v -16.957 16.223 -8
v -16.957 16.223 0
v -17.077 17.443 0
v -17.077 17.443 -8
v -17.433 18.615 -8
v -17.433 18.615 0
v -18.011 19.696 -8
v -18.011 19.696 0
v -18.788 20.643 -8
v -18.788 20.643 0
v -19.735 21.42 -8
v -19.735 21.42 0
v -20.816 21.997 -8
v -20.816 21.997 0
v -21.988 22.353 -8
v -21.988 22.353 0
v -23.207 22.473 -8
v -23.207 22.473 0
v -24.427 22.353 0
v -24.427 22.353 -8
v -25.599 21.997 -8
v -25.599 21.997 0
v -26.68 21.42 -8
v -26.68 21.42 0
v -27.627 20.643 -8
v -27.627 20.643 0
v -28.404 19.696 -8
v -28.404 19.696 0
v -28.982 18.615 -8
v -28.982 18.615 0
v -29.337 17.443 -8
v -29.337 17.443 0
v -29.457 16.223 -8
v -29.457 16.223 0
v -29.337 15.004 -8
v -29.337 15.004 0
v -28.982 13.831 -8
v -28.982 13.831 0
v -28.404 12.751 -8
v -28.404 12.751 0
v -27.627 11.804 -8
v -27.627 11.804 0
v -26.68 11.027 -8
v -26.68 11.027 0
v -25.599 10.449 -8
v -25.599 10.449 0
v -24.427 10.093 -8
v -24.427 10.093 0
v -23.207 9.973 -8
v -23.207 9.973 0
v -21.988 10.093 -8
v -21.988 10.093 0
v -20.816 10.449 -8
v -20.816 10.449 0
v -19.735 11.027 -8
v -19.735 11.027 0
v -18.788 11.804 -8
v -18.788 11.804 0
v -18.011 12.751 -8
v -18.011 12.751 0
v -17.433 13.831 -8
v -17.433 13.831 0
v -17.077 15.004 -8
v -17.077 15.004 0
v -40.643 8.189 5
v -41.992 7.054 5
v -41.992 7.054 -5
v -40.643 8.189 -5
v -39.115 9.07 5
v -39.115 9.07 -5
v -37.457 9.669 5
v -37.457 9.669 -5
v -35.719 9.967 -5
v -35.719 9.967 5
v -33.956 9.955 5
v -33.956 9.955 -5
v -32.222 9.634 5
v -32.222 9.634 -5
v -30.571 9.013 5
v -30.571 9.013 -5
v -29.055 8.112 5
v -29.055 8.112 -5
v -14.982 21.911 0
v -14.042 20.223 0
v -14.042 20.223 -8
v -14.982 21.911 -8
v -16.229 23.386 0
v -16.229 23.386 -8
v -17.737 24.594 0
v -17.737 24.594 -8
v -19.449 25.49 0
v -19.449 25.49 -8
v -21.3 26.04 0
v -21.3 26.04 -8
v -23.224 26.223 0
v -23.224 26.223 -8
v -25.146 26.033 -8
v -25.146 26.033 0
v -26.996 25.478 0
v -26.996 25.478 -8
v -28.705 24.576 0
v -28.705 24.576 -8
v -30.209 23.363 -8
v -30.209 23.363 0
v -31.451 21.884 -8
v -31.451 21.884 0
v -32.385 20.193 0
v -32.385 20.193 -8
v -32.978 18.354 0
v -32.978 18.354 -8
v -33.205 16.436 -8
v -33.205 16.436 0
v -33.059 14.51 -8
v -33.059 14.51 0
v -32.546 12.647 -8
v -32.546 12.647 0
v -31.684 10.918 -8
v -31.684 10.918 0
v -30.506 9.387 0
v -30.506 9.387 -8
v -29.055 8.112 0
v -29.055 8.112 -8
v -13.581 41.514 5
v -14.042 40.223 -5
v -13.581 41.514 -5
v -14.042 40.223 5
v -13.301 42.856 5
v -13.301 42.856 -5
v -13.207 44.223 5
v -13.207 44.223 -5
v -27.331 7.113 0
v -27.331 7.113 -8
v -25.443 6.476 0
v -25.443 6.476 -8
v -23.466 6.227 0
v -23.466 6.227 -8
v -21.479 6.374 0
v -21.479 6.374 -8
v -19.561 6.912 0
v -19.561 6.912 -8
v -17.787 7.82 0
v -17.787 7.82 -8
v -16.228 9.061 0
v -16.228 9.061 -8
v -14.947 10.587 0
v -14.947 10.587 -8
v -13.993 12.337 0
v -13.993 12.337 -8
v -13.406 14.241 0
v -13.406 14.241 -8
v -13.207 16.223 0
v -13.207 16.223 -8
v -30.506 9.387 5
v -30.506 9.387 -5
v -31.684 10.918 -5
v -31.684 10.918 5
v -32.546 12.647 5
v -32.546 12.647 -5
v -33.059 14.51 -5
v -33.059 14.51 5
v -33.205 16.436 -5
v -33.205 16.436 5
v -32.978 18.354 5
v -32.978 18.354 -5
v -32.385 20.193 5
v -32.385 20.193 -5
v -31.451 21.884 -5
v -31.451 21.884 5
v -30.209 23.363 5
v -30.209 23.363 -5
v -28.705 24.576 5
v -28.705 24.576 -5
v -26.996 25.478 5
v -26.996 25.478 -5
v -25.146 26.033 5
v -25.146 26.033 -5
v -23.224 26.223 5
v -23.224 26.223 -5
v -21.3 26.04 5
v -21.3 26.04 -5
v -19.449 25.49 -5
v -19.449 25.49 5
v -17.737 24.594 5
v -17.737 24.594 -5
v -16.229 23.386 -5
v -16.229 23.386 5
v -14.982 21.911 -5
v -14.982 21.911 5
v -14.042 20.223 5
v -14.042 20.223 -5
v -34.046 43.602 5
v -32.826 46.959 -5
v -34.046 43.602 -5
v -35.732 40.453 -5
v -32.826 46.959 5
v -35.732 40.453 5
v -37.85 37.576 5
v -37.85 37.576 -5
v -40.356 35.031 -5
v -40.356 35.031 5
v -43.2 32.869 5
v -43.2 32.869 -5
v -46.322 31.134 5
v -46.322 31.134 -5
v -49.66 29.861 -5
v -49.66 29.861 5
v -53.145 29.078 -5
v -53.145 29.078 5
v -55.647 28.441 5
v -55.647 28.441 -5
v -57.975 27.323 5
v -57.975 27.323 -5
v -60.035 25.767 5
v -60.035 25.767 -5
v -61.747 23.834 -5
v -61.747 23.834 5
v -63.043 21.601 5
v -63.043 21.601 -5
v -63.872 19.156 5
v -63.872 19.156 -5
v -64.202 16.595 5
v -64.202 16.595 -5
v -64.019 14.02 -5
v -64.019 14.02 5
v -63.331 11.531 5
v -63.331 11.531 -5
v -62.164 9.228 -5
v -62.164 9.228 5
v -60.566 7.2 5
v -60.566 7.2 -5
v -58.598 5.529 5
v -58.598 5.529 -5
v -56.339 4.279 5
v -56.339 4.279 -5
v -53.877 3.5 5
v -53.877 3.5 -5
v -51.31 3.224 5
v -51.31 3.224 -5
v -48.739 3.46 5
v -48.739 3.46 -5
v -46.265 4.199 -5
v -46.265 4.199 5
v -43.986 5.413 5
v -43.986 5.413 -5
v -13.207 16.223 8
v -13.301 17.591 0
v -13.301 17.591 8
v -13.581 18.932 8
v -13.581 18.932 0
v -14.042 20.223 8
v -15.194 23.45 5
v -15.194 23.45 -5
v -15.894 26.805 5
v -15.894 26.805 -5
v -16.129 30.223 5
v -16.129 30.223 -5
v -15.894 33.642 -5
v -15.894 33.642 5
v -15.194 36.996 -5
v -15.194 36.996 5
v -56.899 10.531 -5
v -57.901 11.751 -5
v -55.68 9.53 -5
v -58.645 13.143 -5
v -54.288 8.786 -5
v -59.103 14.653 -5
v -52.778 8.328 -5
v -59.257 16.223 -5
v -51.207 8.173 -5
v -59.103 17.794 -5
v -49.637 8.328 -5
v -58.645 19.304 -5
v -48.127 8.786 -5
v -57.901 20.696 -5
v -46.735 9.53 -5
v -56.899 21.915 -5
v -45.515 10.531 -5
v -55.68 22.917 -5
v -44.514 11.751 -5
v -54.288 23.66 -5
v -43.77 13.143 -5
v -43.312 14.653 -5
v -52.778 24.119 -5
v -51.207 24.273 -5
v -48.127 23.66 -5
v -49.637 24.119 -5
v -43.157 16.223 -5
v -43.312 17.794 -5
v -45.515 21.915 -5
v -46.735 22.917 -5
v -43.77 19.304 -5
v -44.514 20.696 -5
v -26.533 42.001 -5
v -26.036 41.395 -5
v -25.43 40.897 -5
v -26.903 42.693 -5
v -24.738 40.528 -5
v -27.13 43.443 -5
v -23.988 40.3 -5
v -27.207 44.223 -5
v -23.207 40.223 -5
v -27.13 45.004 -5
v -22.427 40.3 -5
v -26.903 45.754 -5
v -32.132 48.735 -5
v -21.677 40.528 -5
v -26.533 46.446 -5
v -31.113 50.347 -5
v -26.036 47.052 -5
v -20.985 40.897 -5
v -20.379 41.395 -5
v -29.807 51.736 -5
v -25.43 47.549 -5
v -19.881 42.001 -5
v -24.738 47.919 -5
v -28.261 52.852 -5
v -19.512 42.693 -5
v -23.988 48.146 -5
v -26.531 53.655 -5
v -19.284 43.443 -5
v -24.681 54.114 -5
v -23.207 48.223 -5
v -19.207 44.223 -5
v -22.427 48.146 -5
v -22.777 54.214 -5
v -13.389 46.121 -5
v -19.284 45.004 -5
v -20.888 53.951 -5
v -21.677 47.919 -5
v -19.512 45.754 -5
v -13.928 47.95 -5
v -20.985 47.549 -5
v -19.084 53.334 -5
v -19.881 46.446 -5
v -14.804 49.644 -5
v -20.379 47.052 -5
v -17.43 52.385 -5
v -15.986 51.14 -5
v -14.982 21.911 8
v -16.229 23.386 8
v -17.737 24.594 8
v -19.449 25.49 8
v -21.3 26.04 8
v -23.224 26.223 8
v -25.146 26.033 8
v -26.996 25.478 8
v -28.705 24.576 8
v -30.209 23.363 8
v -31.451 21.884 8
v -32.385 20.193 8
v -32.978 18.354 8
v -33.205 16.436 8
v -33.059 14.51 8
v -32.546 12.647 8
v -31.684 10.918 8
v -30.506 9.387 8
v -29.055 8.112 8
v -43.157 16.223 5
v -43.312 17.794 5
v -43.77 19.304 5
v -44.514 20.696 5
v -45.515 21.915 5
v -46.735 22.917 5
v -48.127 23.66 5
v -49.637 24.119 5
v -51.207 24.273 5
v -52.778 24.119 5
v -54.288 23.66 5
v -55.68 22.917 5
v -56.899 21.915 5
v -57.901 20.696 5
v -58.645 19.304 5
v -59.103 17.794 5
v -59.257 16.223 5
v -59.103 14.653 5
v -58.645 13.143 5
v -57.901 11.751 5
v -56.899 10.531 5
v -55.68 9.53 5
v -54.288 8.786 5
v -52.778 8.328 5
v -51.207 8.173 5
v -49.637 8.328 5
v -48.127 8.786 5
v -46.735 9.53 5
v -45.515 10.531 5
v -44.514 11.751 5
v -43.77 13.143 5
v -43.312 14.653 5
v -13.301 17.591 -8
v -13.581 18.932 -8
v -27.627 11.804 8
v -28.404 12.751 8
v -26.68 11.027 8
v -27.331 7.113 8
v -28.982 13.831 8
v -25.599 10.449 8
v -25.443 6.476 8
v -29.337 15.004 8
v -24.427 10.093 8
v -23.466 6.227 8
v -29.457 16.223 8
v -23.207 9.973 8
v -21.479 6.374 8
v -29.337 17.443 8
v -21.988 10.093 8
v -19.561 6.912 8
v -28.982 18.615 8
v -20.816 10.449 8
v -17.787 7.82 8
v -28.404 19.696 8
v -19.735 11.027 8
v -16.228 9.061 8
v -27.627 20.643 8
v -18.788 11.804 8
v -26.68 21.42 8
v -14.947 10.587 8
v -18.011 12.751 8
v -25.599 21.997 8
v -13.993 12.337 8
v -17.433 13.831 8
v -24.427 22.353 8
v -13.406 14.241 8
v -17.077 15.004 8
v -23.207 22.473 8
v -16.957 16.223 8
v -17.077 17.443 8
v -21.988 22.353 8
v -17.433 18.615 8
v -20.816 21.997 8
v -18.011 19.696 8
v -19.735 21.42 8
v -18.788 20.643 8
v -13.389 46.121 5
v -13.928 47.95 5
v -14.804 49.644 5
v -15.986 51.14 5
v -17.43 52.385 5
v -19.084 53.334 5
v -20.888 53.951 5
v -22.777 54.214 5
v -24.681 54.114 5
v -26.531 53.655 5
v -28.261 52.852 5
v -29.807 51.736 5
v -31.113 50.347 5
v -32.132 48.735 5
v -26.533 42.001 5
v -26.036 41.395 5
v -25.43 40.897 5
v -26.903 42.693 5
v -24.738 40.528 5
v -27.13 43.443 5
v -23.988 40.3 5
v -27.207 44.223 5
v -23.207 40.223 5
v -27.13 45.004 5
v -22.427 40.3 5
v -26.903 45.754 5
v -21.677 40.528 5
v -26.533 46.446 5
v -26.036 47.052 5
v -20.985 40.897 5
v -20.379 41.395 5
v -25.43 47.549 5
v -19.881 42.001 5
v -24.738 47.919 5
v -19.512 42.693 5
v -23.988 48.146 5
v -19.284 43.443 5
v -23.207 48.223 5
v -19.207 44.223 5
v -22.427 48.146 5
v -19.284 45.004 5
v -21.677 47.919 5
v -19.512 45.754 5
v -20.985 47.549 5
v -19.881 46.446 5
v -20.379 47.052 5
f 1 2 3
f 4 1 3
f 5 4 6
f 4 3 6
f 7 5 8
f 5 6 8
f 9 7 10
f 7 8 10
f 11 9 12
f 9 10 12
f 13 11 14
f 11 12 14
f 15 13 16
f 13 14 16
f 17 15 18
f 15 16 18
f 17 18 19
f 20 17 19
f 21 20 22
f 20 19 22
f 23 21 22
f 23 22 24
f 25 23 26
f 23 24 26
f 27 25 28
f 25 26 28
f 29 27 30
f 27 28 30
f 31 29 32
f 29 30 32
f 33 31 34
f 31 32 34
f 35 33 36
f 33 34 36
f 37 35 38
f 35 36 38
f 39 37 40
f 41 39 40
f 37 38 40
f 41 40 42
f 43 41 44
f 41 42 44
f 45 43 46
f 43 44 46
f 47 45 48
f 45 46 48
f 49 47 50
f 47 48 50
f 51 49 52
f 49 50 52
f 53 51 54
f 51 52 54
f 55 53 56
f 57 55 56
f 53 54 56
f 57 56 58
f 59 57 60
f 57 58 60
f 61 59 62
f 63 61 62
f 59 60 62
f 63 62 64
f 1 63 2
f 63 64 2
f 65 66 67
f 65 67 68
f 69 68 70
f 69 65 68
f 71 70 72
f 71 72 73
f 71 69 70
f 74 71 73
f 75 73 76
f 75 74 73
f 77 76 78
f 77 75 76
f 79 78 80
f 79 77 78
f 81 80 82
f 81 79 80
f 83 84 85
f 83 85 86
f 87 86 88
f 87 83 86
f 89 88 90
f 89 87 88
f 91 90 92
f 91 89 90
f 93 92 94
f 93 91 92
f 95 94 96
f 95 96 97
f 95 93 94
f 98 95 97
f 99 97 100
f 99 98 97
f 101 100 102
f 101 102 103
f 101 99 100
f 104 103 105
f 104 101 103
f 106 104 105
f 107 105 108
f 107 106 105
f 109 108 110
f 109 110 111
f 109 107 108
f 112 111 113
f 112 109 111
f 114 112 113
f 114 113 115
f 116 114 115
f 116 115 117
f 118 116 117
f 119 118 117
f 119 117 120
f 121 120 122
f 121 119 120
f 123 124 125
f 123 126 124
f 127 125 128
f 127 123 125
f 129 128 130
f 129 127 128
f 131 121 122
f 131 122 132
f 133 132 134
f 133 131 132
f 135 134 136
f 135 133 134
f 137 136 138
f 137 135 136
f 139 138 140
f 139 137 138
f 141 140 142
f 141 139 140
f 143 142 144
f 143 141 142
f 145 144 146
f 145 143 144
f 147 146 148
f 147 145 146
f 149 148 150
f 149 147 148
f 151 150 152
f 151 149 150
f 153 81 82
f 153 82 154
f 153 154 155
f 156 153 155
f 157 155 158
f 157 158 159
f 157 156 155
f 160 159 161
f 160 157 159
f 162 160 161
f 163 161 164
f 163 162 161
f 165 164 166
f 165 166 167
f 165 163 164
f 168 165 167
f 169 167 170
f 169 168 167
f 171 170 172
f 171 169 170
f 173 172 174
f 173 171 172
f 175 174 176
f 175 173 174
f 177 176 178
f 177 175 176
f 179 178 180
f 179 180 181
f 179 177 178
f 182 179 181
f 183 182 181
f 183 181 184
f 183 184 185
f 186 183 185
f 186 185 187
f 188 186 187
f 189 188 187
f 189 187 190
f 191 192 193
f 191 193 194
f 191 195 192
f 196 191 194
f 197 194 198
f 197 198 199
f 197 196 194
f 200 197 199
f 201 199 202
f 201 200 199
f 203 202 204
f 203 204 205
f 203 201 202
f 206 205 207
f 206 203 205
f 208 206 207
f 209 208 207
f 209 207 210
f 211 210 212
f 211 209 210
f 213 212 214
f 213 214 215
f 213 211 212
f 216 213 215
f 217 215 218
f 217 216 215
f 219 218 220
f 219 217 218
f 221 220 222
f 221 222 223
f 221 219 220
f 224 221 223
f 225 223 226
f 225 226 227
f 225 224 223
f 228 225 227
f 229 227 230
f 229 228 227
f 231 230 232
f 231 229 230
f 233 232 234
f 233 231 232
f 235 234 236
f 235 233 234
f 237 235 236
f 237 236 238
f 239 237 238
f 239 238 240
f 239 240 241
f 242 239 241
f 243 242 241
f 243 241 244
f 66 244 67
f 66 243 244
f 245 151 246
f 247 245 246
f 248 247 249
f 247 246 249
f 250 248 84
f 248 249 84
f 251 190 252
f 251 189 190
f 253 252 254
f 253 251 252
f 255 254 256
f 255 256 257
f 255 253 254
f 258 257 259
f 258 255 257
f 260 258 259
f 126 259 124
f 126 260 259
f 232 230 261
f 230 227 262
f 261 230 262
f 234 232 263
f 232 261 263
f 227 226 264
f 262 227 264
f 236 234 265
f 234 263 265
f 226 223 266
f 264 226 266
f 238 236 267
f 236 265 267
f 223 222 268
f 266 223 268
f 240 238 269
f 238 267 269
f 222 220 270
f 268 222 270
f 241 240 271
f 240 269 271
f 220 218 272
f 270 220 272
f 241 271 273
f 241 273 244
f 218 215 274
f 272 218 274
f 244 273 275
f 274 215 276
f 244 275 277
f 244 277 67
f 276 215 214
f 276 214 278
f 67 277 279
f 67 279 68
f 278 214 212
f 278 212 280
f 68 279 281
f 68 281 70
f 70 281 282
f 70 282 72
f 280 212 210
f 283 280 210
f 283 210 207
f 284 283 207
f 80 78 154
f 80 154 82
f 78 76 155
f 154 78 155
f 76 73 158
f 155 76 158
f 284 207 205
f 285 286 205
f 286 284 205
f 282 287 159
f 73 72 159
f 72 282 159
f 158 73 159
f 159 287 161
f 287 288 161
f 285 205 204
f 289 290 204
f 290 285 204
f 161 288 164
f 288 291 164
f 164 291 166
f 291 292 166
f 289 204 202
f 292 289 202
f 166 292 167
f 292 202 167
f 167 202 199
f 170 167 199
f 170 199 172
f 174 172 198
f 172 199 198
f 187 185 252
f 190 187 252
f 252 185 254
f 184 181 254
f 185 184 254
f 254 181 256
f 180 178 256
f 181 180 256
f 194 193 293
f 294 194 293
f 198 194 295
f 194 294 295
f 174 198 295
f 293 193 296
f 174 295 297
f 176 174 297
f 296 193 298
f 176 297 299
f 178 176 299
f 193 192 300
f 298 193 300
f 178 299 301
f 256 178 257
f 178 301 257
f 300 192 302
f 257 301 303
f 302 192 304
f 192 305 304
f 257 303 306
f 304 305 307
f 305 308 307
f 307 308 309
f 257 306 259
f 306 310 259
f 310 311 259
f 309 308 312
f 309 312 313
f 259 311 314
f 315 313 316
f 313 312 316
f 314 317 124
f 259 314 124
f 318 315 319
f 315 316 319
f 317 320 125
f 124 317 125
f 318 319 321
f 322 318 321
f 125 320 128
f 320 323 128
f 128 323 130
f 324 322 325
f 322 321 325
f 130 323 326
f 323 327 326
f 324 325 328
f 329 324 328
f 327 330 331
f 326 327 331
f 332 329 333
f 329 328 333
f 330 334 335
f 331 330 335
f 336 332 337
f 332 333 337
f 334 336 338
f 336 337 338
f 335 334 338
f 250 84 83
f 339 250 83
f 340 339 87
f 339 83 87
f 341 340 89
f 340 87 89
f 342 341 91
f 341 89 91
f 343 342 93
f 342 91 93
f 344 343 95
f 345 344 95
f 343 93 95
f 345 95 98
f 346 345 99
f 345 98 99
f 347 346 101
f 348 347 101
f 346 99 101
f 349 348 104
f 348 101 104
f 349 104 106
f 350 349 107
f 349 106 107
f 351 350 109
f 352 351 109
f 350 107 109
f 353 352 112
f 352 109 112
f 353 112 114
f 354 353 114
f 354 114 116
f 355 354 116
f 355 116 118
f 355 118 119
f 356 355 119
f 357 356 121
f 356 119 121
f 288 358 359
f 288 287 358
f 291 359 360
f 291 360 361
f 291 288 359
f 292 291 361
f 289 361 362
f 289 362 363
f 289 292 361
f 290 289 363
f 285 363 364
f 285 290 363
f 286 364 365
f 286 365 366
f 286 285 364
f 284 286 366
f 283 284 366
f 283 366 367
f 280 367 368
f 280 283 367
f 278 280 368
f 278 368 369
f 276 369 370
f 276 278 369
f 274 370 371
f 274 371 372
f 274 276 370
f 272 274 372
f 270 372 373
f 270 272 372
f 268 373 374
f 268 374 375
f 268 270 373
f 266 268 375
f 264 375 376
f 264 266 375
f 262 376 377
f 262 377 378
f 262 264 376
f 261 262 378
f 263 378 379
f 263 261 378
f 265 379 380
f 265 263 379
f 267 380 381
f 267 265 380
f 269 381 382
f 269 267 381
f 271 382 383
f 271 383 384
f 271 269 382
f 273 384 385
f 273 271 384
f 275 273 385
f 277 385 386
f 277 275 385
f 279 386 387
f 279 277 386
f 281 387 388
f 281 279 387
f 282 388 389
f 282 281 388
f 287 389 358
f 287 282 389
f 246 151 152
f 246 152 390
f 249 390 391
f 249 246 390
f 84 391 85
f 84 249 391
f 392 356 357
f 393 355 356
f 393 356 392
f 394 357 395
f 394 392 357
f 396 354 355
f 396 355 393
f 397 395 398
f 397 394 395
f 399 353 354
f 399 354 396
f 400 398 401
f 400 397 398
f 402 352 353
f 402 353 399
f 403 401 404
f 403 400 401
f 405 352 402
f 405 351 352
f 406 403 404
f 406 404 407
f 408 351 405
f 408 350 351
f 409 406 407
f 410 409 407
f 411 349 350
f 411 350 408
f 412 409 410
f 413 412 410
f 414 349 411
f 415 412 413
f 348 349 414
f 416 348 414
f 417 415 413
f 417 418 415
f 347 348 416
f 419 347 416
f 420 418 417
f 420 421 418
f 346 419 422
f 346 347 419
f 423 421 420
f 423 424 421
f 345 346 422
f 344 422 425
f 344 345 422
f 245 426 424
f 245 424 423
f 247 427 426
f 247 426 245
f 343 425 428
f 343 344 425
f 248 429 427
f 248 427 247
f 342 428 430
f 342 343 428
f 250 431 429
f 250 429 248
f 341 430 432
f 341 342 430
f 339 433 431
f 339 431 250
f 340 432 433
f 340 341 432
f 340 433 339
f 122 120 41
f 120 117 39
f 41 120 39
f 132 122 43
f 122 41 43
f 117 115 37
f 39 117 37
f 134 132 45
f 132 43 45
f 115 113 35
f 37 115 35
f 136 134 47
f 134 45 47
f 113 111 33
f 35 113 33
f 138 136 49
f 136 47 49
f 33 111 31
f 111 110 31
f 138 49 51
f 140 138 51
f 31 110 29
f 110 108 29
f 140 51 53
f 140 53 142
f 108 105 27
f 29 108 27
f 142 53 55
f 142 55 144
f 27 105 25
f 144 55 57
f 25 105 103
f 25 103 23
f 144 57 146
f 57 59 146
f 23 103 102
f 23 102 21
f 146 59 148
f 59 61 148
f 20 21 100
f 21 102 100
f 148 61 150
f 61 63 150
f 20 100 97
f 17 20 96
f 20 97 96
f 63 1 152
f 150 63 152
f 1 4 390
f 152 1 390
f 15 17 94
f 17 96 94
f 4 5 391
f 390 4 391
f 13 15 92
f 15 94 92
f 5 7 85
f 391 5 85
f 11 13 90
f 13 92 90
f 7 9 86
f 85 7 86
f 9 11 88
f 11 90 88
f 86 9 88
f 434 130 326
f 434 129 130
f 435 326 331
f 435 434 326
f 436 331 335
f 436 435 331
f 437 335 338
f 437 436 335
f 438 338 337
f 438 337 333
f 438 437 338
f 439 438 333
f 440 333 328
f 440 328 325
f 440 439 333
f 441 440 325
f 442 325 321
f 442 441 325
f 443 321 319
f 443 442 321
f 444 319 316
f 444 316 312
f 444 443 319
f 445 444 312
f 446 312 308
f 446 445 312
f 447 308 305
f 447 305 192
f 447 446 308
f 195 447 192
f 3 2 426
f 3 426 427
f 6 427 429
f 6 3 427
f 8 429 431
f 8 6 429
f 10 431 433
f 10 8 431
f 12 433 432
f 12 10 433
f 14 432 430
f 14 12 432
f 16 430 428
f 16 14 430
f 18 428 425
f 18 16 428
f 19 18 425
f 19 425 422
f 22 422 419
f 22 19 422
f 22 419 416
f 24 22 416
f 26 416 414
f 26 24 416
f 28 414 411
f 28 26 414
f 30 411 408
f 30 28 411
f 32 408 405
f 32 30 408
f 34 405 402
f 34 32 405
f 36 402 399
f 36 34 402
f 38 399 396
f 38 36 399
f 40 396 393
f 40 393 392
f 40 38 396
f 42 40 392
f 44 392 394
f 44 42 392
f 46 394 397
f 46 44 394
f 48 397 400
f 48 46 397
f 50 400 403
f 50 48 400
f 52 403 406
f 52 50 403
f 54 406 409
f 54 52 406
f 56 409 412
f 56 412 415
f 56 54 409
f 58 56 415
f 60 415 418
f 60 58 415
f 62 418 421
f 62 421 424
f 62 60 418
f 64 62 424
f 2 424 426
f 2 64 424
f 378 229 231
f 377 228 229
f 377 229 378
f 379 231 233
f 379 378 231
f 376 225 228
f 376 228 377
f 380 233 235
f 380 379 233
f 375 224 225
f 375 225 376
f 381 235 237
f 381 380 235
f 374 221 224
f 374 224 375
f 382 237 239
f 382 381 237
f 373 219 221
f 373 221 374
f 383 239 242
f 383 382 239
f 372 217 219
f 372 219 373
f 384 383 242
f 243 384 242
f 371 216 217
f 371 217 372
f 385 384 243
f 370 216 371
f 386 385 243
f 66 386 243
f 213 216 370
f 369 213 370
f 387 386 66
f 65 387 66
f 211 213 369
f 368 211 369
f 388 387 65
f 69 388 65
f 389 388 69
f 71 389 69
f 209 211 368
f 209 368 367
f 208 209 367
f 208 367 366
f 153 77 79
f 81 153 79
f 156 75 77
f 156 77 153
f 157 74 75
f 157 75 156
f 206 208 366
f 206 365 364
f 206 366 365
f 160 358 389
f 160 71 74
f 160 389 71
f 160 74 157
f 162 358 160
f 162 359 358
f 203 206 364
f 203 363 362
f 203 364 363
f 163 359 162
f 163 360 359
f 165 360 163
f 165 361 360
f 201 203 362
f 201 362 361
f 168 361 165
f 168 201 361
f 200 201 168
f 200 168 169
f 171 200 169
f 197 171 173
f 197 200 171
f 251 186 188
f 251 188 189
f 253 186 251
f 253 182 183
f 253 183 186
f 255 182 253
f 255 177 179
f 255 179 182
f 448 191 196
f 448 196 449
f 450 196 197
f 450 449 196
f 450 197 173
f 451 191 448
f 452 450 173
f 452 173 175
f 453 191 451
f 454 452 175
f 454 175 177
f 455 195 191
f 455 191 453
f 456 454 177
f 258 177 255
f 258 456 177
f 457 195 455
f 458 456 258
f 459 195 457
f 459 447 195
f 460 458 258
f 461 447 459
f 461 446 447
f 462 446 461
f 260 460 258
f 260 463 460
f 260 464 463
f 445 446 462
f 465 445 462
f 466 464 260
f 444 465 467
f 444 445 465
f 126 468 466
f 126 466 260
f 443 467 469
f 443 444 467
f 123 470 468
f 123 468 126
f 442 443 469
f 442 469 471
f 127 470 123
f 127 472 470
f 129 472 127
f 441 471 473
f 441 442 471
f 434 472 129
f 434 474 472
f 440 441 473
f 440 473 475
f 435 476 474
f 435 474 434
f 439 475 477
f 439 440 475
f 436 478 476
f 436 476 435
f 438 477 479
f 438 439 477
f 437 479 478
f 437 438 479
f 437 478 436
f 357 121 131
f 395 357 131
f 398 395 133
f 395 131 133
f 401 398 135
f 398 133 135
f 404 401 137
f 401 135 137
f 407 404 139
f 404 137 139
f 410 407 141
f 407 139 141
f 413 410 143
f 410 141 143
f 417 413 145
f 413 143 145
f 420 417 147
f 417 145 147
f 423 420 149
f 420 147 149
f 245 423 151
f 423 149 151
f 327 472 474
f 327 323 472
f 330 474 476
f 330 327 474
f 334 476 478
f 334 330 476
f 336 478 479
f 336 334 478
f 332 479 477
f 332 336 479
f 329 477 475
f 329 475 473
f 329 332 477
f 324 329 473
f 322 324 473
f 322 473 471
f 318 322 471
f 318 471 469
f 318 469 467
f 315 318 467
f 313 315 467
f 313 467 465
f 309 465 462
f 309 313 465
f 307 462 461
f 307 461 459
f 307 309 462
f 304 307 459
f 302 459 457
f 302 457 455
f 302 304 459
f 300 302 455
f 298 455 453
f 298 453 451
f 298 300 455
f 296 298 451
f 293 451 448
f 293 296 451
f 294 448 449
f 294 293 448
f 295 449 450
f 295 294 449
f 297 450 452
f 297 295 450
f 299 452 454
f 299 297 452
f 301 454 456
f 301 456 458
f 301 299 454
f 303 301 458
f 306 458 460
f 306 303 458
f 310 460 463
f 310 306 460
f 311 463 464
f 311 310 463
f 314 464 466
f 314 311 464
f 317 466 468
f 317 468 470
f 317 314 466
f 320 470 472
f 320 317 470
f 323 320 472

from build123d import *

# Parameters (mm, degrees)
F0_R     = 6.25
F1_DEPTH = 8
F0_R_2   = 4
F0_R_3   = 8.05
F2_DEPTH = 5


with BuildPart() as f1:
    # F0 (on Top) → F1 (new body, symmetric)
    with BuildSketch(Plane.XY):
        with BuildLine():
            ThreePointArc((-13.2072802739, 16.2232413122), (-13.4182171347, 18.2663377013), (-14.042128845, 20.2232412226))
            ThreePointArc((-14.042128845, 20.2232412226), (-29.4860823685, 24.0063412253), (-29.055494634, 8.1116207097))
            ThreePointArc((-29.055494634, 8.1116207097), (-18.6510835925, 7.3214958766), (-13.2072802739, 16.2232413122))
        make_face()
        with Locations((-23.2072802739, 16.2232413122)):
            Circle(F0_R, mode=Mode.SUBTRACT)
    extrude(amount=F1_DEPTH, both=True)


with BuildPart() as f2:
    # F0 (on Top) → F2 (new body, symmetric)
    with BuildSketch(Plane.XY):
        with BuildLine():
            ThreePointArc((-14.042128845, 40.2232414017), (-26.5828145137, 34.8101775922), (-32.8257640324, 46.9590721162))
            ThreePointArc((-32.8257640324, 46.9590721162), (-40.3562861134, 35.0308021348), (-53.1452019023, 29.0779859523))
            ThreePointArc((-53.1452019023, 29.0779859523), (-42.7276865681, 26.0769964636), (-38.2072802739, 16.2232413122))
            ThreePointArc((-38.2072802739, 16.2232413122), (-39.1907123191, 11.2631914548), (-41.9922179028, 7.0535834398))
            ThreePointArc((-41.9922179028, 7.0535834398), (-35.7188429094, 9.9667224531), (-29.055494634, 8.1116207097))
            ThreePointArc((-29.055494634, 8.1116207097), (-29.4860823685, 24.0063412253), (-14.042128845, 20.2232412226))
            ThreePointArc((-14.042128845, 20.2232412226), (-16.1292504093, 30.2232413122), (-14.042128845, 40.2232414017))
        make_face()
        with BuildLine():
            ThreePointArc((-14.042128845, 40.2232414017), (-13.4182171347, 42.1801449231), (-13.2072802739, 44.2232413122))
            ThreePointArc((-13.2072802739, 44.2232413122), (-21.8261281434, 54.1274030027), (-32.8257640324, 46.9590721162))
            ThreePointArc((-32.8257640324, 46.9590721162), (-26.5828145137, 34.8101775922), (-14.042128845, 40.2232414017))
        make_face()
        with Locations((-23.2072802739, 44.2232413122)):
            Circle(F0_R_2, mode=Mode.SUBTRACT)
        with BuildLine():
            ThreePointArc((-38.2072802739, 16.2232413122), (-42.7276865681, 26.0769964636), (-53.1452019023, 29.0779859523))
            ThreePointArc((-53.1452019023, 29.0779859523), (-62.8050287992, 10.3502327863), (-41.9922179028, 7.0535834398))
            ThreePointArc((-41.9922179028, 7.0535834398), (-39.1907123191, 11.2631914548), (-38.2072802739, 16.2232413122))
        make_face()
        with Locations((-51.2072802739, 16.2232413122)):
            Circle(F0_R_3, mode=Mode.SUBTRACT)
    extrude(amount=F2_DEPTH, both=True)


solid = Compound([f1.part, f2.part])
